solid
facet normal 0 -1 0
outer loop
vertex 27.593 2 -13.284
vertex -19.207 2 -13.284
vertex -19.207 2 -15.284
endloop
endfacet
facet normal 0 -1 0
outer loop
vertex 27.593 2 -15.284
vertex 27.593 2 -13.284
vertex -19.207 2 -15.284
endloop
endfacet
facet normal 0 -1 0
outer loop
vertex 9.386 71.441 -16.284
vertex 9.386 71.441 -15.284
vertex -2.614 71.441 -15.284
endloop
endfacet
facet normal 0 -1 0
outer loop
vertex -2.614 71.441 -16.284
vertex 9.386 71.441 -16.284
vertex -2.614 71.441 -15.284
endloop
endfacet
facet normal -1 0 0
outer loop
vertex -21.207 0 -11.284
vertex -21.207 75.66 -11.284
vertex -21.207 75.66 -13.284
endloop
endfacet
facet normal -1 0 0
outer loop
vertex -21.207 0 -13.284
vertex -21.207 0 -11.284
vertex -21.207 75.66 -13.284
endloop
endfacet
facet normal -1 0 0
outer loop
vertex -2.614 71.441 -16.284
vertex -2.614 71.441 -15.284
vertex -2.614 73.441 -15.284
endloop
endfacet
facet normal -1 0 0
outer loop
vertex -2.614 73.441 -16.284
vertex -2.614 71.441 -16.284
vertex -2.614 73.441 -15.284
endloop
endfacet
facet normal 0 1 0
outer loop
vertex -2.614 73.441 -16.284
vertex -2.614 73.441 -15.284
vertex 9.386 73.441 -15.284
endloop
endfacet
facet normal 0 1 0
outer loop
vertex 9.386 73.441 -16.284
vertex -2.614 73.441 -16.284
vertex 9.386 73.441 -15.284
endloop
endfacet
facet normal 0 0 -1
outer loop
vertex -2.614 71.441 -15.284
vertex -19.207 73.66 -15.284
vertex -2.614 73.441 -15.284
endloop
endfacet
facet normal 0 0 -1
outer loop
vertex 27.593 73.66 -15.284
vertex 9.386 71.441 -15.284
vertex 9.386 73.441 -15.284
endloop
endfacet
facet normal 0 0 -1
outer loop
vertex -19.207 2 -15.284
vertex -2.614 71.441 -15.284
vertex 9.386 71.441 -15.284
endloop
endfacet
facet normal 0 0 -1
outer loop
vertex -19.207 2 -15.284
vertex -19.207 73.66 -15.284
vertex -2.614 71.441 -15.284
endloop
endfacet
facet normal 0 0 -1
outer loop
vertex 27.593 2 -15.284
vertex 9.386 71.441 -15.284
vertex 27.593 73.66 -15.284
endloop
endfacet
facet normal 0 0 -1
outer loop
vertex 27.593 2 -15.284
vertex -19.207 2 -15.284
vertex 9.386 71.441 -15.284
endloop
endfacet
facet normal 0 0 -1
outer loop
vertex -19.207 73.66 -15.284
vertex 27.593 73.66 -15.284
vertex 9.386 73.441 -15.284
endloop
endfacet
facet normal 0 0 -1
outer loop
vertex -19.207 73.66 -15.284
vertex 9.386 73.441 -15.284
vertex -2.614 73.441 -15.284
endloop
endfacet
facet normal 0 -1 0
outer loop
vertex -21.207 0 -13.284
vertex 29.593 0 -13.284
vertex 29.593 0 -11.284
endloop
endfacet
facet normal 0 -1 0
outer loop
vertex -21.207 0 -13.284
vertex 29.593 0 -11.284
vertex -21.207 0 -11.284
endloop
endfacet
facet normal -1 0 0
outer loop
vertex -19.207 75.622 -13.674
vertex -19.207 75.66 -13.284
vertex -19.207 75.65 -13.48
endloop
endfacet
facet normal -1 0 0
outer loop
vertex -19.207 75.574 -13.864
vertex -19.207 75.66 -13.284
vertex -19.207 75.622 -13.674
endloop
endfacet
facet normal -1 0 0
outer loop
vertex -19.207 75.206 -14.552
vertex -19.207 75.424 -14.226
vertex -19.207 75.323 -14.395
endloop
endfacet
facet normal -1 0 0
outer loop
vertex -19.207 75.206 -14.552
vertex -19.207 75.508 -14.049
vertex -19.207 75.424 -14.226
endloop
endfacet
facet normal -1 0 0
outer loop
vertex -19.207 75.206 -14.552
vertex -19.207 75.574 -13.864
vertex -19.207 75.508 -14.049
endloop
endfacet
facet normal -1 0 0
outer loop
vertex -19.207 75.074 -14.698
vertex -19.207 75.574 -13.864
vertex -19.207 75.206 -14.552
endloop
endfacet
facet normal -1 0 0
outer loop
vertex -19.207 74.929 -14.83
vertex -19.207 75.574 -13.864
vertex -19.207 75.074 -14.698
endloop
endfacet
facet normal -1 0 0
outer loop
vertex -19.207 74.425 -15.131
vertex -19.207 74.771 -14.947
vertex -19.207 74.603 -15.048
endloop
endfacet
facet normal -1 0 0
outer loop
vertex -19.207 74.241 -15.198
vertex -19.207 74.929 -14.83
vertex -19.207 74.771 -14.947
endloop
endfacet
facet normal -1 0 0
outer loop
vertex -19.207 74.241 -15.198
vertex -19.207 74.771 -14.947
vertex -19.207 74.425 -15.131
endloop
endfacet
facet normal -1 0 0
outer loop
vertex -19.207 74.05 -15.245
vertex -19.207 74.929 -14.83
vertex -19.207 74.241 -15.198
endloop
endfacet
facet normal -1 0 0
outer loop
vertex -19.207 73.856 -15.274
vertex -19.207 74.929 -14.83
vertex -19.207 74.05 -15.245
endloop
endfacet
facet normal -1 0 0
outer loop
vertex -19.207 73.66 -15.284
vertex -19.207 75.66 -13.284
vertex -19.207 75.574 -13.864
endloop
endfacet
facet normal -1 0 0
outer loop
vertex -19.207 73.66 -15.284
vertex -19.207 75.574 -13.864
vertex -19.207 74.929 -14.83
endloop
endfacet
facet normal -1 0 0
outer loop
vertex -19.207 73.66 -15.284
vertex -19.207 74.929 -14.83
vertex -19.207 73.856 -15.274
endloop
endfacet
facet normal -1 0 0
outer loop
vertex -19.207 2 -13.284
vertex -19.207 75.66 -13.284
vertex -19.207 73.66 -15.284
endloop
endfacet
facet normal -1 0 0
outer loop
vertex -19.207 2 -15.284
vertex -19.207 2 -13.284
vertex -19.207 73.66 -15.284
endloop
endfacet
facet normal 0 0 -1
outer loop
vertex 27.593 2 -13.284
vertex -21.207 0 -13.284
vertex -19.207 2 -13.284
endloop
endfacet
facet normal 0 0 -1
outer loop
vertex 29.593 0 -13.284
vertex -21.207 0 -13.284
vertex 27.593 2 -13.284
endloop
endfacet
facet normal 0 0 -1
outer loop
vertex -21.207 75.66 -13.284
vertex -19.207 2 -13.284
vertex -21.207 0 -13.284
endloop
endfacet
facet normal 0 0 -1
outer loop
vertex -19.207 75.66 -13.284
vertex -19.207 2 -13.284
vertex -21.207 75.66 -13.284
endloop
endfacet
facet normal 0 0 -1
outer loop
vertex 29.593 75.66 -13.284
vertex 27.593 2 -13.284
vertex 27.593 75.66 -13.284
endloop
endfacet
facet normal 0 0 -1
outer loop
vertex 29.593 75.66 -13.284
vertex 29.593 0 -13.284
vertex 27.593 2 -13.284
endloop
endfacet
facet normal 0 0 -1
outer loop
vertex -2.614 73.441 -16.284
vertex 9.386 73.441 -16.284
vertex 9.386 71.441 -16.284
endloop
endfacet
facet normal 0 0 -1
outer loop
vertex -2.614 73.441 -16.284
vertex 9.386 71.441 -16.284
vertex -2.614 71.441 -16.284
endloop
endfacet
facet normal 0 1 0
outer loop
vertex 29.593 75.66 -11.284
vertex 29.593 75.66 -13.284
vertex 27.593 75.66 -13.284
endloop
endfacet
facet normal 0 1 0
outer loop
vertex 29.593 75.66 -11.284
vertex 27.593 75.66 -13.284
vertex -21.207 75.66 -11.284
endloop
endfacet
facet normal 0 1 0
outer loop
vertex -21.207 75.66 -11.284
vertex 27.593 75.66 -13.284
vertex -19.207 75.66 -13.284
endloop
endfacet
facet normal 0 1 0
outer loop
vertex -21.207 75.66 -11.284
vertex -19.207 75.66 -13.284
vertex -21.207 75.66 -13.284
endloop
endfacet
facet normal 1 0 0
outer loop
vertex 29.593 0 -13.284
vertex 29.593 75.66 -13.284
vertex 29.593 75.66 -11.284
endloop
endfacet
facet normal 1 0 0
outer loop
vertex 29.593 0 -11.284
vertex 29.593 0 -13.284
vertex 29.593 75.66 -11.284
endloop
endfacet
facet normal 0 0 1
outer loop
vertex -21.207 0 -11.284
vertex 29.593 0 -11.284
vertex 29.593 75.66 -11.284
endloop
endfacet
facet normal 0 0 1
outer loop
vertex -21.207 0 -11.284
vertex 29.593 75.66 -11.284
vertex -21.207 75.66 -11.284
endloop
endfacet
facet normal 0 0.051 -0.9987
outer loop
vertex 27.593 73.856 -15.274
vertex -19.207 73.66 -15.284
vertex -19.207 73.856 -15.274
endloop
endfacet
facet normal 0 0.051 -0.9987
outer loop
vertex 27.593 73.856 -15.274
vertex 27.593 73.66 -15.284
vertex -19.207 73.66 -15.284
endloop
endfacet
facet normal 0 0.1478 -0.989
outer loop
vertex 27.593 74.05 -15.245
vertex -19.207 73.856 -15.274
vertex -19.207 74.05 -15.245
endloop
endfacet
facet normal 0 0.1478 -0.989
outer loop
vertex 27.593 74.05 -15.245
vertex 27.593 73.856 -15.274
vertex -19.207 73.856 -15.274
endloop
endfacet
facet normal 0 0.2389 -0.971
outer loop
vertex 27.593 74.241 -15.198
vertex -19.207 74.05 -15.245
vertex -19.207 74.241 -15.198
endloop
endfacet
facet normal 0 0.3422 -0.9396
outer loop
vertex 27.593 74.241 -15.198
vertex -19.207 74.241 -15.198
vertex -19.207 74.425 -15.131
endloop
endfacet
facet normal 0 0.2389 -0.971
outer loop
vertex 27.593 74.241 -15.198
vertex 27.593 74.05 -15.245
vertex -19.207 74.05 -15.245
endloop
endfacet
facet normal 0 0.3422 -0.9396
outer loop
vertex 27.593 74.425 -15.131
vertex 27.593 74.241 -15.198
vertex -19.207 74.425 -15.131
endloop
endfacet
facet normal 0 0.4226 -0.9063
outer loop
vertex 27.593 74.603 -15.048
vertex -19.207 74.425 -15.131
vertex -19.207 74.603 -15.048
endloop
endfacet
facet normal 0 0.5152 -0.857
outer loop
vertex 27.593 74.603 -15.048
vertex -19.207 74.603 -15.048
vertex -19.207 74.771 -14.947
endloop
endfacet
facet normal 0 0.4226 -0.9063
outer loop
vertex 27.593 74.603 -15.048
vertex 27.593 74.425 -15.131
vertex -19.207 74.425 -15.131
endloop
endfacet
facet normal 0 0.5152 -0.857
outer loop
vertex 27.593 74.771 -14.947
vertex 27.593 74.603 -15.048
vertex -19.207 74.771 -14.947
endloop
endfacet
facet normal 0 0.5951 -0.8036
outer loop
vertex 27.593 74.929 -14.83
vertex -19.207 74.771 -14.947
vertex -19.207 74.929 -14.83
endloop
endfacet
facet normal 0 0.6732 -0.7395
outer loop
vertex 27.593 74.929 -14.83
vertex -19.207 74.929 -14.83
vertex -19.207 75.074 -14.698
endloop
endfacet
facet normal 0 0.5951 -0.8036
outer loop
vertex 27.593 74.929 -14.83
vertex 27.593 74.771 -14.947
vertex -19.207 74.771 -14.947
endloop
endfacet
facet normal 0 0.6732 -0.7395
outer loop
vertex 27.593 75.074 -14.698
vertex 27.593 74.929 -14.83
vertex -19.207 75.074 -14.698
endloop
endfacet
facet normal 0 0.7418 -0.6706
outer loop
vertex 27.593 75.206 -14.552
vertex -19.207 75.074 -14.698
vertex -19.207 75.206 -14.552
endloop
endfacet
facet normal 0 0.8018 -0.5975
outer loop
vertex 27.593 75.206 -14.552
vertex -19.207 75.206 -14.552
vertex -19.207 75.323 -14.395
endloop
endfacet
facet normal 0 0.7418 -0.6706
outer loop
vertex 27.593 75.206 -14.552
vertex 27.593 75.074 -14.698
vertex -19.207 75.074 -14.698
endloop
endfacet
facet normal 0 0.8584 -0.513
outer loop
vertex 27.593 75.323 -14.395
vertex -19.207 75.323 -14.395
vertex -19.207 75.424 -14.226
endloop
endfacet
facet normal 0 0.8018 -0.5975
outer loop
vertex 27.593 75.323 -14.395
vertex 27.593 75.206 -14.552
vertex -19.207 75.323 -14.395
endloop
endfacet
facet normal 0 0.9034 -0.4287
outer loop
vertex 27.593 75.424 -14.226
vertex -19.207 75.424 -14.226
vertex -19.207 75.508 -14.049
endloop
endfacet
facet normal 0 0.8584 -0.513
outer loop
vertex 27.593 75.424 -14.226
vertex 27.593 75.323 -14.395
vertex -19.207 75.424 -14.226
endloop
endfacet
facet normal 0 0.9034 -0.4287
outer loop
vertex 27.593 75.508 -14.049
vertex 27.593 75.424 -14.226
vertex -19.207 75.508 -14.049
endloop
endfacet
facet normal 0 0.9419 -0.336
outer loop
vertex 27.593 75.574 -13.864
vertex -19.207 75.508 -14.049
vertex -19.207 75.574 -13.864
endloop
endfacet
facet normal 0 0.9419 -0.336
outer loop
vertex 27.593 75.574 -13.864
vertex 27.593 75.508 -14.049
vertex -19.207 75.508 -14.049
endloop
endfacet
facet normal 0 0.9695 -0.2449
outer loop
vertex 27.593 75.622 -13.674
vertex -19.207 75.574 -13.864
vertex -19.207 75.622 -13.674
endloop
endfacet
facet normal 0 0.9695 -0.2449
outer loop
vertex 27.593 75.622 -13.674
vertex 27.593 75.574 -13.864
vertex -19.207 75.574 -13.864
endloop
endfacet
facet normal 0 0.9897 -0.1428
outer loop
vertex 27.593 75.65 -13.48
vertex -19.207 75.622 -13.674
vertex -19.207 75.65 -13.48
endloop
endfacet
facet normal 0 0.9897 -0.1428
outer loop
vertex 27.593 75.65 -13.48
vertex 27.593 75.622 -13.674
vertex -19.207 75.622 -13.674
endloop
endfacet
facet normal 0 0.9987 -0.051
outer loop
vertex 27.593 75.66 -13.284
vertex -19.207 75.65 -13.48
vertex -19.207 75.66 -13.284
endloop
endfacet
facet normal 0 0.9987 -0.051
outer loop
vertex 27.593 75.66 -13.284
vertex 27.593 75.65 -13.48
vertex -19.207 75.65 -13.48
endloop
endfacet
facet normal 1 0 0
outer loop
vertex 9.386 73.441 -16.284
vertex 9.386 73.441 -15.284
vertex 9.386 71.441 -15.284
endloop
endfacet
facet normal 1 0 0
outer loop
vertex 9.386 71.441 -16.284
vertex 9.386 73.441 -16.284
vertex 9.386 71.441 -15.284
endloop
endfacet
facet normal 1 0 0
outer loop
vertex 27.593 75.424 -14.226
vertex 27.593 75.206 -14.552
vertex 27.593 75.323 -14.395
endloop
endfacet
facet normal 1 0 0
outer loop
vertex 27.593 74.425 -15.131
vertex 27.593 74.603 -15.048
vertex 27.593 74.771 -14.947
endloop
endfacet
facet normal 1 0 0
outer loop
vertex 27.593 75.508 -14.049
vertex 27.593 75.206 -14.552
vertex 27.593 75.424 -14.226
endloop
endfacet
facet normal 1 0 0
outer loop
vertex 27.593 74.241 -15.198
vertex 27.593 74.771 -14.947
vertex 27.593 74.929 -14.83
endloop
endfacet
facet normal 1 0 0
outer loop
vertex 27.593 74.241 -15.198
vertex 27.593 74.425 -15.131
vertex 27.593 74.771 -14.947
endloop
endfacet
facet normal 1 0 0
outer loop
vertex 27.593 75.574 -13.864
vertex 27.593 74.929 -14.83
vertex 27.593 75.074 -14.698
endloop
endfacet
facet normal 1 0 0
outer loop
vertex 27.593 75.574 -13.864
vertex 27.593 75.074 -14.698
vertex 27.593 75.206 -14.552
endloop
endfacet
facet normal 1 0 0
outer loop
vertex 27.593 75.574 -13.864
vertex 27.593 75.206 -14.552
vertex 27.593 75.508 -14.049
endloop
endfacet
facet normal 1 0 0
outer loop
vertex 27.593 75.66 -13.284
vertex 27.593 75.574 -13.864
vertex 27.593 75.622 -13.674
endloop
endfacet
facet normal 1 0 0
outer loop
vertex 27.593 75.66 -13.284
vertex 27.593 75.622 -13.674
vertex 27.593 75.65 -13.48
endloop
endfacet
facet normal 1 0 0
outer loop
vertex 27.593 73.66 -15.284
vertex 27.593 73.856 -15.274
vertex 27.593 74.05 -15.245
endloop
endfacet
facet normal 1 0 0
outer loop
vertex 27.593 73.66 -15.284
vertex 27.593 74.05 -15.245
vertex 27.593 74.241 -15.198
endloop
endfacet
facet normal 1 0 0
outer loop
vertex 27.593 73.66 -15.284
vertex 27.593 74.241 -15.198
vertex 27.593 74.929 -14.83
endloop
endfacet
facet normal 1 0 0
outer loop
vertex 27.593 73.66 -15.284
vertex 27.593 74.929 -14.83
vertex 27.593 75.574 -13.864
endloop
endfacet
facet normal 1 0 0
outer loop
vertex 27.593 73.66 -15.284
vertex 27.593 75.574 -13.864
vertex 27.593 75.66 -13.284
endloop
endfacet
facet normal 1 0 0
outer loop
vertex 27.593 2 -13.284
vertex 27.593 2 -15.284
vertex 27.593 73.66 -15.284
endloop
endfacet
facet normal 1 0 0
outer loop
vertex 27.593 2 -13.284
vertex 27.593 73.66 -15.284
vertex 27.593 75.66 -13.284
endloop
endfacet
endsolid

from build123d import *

# Parameters (mm, degrees)
BOSS_EXTRUDE2_DEPTH = 75.66
SKETCH2_W           = 2
SKETCH2_H           = 2
CUT_EXTRUDE2_DEPTH  = 69
FILLET1_R           = 2
BOSS_EXTRUDE5_DEPTH = 1


with BuildPart() as part:
    # Sketch1 → Boss-Extrude2 (new body)
    with BuildSketch(Plane(origin=(0, 0, 0), x_dir=(1, 0, 0), z_dir=(0, 1, 0))):
        Polygon((-19.20717284, 15.283675177), (27.59282716, 15.283675177), (27.59282716, 13.283675177), (29.59282716, 13.283675177), (29.59282716, 11.283675177), (-21.20717284, 11.283675177), (-21.20717284, 13.283675177), (-19.20717284, 13.283675177), align=None)
    extrude(amount=BOSS_EXTRUDE2_DEPTH)

    # Sketch2 → Cut-Extrude2 (cut)
    with BuildSketch(Plane(origin=(27.59282716, 0, 0), x_dir=(0, 0, -1), z_dir=(1, 0, 0))):
        with Locations((14.283675177, 1)):
            Rectangle(SKETCH2_W, SKETCH2_H)
    extrude(amount=-CUT_EXTRUDE2_DEPTH, mode=Mode.SUBTRACT)

    # Fillet1
    fillet1_edges = [part.edges().sort_by_distance(p)[0] for p in [
        (4.19282716, 75.66, -15.283675177),
    ]]
    fillet(fillet1_edges, radius=FILLET1_R)

    # Sketch3 → Boss-Extrude5 (add)
    with BuildSketch(Plane(origin=(0, 0, -15.283675177), x_dir=(-1, 0, 0), z_dir=(0, 0, -1))):
        Polygon((2.614345679, 73.441300995), (-8.385654321, 73.441300995), (-9.385654321, 73.441300995), (-9.385654321, 71.441300995), (-8.385654321, 71.441300995), (2.614345679, 71.441300995), align=None)
    extrude(amount=BOSS_EXTRUDE5_DEPTH)


solid = part.part
